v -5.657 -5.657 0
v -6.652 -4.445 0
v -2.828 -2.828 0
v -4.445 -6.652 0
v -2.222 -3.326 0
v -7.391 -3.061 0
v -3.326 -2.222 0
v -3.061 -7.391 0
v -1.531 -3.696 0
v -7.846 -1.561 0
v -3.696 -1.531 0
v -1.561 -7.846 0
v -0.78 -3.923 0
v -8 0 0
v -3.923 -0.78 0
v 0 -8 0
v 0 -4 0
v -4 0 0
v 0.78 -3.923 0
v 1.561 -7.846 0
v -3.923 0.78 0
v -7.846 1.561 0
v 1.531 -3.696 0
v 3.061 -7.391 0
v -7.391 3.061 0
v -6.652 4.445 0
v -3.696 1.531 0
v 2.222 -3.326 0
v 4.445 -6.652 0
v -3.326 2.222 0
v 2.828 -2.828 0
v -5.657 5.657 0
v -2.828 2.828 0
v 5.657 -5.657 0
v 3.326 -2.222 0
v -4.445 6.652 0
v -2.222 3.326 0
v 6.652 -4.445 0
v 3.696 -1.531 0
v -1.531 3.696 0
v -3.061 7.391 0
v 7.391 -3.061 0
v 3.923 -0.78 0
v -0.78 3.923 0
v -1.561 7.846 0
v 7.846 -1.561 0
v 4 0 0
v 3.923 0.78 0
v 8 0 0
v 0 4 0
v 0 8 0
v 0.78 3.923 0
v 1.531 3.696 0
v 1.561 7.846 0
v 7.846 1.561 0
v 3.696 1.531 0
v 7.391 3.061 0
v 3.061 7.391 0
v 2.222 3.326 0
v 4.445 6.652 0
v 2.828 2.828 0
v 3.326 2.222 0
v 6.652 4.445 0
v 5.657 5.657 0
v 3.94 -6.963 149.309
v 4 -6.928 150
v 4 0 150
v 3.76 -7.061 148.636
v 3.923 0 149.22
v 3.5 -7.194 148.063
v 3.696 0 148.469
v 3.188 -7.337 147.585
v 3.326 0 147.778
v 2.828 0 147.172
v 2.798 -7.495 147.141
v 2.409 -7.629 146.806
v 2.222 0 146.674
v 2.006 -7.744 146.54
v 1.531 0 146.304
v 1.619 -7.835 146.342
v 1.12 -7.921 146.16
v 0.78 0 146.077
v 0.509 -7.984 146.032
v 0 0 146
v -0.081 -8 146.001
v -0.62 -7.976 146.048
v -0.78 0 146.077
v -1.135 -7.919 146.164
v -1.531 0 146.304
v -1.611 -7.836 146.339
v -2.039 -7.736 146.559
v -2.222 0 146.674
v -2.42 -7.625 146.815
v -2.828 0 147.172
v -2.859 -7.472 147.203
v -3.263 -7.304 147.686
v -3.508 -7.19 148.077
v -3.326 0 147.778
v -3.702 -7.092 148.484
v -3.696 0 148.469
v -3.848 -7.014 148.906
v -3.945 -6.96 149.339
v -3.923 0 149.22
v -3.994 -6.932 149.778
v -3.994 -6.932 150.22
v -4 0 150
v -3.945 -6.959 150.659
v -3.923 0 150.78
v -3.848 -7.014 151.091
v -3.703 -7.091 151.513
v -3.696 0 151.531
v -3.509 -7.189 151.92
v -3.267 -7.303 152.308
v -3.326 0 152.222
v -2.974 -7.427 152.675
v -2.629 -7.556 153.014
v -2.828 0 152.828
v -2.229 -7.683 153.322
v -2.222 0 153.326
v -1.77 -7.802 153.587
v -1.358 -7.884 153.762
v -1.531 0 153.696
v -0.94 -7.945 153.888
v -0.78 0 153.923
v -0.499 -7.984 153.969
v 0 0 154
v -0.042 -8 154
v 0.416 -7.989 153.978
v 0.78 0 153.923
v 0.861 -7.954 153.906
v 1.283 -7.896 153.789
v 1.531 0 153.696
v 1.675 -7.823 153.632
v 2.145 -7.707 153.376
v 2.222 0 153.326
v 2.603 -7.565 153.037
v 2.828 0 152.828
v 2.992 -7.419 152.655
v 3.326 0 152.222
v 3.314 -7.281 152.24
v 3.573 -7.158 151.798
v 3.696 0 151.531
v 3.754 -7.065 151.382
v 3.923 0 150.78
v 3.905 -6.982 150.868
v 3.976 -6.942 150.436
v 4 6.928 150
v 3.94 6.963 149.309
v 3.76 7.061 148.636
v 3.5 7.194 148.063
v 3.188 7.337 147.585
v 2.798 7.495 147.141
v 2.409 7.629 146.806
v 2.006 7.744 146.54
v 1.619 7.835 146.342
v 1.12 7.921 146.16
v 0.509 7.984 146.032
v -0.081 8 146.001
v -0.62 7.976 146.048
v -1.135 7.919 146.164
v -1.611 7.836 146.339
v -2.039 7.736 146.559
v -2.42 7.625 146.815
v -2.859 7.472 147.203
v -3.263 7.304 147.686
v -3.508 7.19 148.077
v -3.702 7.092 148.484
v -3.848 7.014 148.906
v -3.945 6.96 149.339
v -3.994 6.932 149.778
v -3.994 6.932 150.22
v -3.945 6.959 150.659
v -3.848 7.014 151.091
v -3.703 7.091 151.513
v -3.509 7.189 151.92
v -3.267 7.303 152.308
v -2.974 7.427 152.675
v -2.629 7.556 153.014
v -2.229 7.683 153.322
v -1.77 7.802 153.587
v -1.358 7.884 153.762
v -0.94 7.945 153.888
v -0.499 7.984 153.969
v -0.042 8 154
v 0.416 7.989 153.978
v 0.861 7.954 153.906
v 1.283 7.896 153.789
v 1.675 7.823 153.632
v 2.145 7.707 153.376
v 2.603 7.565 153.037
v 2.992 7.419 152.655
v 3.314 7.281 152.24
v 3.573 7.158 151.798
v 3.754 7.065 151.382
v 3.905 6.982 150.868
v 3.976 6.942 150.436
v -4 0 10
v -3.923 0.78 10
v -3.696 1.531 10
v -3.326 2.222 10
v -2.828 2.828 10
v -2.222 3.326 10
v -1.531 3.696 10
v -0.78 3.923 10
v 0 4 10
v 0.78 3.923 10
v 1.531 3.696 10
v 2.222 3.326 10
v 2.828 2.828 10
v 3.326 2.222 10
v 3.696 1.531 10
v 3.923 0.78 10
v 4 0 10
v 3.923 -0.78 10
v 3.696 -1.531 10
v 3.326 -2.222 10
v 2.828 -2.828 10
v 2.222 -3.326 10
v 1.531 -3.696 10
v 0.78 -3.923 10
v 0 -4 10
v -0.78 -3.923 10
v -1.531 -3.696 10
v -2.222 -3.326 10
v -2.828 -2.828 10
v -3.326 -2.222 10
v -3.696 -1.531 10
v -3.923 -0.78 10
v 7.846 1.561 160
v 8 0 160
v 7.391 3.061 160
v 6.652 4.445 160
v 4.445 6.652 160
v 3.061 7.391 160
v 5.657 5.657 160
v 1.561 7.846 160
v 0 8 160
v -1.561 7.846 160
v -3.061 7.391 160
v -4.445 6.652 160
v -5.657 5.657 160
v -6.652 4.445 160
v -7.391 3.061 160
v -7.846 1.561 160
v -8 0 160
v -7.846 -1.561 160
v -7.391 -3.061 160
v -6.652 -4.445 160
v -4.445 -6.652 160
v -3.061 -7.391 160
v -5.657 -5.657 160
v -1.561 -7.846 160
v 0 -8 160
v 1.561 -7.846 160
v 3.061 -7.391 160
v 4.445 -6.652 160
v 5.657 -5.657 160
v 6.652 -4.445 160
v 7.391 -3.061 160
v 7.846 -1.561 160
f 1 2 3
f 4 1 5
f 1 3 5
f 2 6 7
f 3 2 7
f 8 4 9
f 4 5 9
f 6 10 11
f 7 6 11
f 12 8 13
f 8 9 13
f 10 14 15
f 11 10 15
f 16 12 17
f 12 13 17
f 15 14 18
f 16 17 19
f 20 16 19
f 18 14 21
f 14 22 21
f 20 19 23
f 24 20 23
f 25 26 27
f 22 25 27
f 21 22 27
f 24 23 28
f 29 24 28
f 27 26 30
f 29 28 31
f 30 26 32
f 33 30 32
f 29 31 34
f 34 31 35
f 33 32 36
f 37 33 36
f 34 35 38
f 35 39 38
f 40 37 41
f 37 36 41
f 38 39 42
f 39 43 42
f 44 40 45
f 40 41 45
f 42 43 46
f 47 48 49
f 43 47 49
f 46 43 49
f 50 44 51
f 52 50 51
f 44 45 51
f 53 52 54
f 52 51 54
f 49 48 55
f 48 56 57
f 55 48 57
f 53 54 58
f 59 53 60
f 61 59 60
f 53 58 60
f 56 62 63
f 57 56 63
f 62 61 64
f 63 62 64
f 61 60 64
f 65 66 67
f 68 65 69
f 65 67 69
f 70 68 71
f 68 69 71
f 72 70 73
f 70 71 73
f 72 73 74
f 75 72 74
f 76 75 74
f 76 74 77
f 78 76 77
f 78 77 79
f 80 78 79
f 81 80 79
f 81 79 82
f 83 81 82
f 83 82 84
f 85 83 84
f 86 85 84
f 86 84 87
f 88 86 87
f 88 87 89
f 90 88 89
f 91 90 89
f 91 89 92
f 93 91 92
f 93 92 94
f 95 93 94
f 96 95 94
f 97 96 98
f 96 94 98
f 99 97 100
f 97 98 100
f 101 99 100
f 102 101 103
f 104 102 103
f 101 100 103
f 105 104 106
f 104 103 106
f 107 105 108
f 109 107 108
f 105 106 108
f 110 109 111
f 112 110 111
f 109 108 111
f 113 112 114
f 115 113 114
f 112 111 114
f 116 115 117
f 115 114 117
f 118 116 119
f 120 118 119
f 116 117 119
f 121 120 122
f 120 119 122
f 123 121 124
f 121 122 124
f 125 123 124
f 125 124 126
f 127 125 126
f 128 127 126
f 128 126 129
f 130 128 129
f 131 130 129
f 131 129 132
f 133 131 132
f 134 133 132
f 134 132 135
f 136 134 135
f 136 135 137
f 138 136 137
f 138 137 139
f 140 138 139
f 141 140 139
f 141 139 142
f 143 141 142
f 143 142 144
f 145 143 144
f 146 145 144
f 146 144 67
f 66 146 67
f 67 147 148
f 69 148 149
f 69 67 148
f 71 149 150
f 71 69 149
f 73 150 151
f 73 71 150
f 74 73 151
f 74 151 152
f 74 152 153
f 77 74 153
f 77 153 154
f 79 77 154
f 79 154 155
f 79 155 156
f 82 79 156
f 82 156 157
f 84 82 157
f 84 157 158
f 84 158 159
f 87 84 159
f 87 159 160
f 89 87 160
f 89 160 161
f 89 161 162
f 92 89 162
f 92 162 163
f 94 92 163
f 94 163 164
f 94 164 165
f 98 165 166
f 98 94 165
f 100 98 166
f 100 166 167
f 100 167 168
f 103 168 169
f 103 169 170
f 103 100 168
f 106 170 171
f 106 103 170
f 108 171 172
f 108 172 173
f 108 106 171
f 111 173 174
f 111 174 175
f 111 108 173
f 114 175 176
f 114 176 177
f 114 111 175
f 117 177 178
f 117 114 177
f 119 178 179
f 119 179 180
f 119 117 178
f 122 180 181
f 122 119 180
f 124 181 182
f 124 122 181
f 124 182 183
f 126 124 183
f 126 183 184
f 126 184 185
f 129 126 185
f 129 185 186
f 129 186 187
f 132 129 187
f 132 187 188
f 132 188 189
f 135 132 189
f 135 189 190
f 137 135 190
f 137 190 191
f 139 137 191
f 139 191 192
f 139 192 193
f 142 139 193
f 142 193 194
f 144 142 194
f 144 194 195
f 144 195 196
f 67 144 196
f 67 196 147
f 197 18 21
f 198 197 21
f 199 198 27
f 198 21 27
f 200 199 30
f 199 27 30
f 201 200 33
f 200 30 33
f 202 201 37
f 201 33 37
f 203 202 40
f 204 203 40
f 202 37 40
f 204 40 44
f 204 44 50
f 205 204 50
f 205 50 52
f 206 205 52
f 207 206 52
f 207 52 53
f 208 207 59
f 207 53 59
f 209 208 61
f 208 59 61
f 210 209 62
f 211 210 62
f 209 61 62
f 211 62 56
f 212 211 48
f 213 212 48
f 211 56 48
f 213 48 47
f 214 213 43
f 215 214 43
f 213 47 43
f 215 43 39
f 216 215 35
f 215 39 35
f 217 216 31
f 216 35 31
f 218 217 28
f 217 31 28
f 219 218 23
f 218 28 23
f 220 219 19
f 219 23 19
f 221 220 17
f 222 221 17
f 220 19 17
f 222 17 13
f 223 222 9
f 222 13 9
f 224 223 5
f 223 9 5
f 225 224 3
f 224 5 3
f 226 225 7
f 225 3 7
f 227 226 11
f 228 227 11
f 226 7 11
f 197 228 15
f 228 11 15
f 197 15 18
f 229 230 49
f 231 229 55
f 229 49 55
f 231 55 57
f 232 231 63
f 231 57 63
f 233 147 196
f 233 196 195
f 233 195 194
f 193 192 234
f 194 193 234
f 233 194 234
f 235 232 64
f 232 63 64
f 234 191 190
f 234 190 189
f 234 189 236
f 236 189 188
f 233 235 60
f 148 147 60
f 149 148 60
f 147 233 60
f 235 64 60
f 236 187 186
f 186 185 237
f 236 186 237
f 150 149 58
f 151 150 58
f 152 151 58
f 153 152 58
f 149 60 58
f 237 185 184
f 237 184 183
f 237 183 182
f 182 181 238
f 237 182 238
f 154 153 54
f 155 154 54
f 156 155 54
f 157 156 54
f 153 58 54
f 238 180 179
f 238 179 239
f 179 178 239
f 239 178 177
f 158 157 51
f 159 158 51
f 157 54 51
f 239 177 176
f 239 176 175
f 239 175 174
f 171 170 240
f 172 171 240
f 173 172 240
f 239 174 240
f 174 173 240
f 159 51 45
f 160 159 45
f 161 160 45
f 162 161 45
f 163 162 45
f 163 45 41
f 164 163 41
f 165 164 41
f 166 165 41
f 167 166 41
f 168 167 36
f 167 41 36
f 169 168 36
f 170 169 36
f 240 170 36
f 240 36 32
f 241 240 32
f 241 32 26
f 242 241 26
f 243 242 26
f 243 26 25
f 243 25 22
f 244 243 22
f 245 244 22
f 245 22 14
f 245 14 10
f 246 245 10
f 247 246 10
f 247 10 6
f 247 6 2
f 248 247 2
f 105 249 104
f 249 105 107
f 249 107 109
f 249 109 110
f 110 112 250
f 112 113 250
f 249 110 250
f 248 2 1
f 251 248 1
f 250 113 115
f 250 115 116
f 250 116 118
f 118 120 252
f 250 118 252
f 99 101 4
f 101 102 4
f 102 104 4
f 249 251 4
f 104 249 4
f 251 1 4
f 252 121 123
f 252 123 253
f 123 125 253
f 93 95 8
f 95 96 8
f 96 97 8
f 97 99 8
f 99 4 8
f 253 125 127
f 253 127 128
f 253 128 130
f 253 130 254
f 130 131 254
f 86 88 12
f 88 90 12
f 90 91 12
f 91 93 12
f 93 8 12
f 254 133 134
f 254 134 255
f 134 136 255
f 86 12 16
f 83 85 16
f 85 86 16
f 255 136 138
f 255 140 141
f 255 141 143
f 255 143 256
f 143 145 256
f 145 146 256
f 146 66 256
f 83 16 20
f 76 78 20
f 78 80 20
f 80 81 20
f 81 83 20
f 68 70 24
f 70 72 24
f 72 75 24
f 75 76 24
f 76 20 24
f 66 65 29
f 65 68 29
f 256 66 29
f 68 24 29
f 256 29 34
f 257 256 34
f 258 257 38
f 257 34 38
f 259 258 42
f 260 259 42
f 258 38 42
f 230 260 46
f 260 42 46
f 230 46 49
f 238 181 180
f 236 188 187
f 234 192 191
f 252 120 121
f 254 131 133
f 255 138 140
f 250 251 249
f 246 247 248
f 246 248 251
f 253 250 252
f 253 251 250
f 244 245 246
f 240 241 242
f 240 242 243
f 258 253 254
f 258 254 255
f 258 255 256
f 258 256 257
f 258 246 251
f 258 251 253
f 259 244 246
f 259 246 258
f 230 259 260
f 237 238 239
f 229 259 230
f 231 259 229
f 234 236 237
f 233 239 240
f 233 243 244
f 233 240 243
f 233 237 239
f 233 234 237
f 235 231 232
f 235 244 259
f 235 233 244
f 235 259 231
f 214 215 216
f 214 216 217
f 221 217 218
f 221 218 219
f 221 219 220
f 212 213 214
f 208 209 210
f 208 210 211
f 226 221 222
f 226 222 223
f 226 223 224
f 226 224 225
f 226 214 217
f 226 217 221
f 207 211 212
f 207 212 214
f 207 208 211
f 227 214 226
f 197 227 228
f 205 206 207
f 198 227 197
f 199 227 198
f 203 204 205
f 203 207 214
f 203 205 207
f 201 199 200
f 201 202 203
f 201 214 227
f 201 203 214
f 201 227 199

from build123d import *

# Parameters (mm, degrees)
SKETCH_1_R               = 8
EXTRUDE_1_DEPTH          = 160
CUT_EXTRUDE_1_DEPTH      = 120
CUT_EXTRUDE_1_DEPTH_BACK = 120
SKETCH_2_R               = 4
SKETCH_3_R               = 4
CUT_EXTRUDE_2_DEPTH      = 10


with BuildPart() as part:
    # 草图1 → 凸台-拉伸1 (new body)
    with BuildSketch(Plane.XY):
        Circle(SKETCH_1_R)
    extrude(amount=EXTRUDE_1_DEPTH)

    # 草图2 → 切除-拉伸1 (cut, two sides: drawn at the far end of the back side and taken through both)
    with BuildSketch(Plane(origin=(0, 0, 0), x_dir=(1, 0, 0), z_dir=(0, 1, 0)).offset(-CUT_EXTRUDE_1_DEPTH_BACK)):
        with Locations((0, -150)):
            Circle(SKETCH_2_R)
    extrude(amount=CUT_EXTRUDE_1_DEPTH + CUT_EXTRUDE_1_DEPTH_BACK, mode=Mode.SUBTRACT)

    # 草图3 → 切除-拉伸2 (cut)
    with BuildSketch(Plane(origin=(0, 0, 0), x_dir=(-1, 0, 0), z_dir=(0, 0, -1))):
        Circle(SKETCH_3_R)
    extrude(amount=-CUT_EXTRUDE_2_DEPTH, mode=Mode.SUBTRACT)


solid = part.part
